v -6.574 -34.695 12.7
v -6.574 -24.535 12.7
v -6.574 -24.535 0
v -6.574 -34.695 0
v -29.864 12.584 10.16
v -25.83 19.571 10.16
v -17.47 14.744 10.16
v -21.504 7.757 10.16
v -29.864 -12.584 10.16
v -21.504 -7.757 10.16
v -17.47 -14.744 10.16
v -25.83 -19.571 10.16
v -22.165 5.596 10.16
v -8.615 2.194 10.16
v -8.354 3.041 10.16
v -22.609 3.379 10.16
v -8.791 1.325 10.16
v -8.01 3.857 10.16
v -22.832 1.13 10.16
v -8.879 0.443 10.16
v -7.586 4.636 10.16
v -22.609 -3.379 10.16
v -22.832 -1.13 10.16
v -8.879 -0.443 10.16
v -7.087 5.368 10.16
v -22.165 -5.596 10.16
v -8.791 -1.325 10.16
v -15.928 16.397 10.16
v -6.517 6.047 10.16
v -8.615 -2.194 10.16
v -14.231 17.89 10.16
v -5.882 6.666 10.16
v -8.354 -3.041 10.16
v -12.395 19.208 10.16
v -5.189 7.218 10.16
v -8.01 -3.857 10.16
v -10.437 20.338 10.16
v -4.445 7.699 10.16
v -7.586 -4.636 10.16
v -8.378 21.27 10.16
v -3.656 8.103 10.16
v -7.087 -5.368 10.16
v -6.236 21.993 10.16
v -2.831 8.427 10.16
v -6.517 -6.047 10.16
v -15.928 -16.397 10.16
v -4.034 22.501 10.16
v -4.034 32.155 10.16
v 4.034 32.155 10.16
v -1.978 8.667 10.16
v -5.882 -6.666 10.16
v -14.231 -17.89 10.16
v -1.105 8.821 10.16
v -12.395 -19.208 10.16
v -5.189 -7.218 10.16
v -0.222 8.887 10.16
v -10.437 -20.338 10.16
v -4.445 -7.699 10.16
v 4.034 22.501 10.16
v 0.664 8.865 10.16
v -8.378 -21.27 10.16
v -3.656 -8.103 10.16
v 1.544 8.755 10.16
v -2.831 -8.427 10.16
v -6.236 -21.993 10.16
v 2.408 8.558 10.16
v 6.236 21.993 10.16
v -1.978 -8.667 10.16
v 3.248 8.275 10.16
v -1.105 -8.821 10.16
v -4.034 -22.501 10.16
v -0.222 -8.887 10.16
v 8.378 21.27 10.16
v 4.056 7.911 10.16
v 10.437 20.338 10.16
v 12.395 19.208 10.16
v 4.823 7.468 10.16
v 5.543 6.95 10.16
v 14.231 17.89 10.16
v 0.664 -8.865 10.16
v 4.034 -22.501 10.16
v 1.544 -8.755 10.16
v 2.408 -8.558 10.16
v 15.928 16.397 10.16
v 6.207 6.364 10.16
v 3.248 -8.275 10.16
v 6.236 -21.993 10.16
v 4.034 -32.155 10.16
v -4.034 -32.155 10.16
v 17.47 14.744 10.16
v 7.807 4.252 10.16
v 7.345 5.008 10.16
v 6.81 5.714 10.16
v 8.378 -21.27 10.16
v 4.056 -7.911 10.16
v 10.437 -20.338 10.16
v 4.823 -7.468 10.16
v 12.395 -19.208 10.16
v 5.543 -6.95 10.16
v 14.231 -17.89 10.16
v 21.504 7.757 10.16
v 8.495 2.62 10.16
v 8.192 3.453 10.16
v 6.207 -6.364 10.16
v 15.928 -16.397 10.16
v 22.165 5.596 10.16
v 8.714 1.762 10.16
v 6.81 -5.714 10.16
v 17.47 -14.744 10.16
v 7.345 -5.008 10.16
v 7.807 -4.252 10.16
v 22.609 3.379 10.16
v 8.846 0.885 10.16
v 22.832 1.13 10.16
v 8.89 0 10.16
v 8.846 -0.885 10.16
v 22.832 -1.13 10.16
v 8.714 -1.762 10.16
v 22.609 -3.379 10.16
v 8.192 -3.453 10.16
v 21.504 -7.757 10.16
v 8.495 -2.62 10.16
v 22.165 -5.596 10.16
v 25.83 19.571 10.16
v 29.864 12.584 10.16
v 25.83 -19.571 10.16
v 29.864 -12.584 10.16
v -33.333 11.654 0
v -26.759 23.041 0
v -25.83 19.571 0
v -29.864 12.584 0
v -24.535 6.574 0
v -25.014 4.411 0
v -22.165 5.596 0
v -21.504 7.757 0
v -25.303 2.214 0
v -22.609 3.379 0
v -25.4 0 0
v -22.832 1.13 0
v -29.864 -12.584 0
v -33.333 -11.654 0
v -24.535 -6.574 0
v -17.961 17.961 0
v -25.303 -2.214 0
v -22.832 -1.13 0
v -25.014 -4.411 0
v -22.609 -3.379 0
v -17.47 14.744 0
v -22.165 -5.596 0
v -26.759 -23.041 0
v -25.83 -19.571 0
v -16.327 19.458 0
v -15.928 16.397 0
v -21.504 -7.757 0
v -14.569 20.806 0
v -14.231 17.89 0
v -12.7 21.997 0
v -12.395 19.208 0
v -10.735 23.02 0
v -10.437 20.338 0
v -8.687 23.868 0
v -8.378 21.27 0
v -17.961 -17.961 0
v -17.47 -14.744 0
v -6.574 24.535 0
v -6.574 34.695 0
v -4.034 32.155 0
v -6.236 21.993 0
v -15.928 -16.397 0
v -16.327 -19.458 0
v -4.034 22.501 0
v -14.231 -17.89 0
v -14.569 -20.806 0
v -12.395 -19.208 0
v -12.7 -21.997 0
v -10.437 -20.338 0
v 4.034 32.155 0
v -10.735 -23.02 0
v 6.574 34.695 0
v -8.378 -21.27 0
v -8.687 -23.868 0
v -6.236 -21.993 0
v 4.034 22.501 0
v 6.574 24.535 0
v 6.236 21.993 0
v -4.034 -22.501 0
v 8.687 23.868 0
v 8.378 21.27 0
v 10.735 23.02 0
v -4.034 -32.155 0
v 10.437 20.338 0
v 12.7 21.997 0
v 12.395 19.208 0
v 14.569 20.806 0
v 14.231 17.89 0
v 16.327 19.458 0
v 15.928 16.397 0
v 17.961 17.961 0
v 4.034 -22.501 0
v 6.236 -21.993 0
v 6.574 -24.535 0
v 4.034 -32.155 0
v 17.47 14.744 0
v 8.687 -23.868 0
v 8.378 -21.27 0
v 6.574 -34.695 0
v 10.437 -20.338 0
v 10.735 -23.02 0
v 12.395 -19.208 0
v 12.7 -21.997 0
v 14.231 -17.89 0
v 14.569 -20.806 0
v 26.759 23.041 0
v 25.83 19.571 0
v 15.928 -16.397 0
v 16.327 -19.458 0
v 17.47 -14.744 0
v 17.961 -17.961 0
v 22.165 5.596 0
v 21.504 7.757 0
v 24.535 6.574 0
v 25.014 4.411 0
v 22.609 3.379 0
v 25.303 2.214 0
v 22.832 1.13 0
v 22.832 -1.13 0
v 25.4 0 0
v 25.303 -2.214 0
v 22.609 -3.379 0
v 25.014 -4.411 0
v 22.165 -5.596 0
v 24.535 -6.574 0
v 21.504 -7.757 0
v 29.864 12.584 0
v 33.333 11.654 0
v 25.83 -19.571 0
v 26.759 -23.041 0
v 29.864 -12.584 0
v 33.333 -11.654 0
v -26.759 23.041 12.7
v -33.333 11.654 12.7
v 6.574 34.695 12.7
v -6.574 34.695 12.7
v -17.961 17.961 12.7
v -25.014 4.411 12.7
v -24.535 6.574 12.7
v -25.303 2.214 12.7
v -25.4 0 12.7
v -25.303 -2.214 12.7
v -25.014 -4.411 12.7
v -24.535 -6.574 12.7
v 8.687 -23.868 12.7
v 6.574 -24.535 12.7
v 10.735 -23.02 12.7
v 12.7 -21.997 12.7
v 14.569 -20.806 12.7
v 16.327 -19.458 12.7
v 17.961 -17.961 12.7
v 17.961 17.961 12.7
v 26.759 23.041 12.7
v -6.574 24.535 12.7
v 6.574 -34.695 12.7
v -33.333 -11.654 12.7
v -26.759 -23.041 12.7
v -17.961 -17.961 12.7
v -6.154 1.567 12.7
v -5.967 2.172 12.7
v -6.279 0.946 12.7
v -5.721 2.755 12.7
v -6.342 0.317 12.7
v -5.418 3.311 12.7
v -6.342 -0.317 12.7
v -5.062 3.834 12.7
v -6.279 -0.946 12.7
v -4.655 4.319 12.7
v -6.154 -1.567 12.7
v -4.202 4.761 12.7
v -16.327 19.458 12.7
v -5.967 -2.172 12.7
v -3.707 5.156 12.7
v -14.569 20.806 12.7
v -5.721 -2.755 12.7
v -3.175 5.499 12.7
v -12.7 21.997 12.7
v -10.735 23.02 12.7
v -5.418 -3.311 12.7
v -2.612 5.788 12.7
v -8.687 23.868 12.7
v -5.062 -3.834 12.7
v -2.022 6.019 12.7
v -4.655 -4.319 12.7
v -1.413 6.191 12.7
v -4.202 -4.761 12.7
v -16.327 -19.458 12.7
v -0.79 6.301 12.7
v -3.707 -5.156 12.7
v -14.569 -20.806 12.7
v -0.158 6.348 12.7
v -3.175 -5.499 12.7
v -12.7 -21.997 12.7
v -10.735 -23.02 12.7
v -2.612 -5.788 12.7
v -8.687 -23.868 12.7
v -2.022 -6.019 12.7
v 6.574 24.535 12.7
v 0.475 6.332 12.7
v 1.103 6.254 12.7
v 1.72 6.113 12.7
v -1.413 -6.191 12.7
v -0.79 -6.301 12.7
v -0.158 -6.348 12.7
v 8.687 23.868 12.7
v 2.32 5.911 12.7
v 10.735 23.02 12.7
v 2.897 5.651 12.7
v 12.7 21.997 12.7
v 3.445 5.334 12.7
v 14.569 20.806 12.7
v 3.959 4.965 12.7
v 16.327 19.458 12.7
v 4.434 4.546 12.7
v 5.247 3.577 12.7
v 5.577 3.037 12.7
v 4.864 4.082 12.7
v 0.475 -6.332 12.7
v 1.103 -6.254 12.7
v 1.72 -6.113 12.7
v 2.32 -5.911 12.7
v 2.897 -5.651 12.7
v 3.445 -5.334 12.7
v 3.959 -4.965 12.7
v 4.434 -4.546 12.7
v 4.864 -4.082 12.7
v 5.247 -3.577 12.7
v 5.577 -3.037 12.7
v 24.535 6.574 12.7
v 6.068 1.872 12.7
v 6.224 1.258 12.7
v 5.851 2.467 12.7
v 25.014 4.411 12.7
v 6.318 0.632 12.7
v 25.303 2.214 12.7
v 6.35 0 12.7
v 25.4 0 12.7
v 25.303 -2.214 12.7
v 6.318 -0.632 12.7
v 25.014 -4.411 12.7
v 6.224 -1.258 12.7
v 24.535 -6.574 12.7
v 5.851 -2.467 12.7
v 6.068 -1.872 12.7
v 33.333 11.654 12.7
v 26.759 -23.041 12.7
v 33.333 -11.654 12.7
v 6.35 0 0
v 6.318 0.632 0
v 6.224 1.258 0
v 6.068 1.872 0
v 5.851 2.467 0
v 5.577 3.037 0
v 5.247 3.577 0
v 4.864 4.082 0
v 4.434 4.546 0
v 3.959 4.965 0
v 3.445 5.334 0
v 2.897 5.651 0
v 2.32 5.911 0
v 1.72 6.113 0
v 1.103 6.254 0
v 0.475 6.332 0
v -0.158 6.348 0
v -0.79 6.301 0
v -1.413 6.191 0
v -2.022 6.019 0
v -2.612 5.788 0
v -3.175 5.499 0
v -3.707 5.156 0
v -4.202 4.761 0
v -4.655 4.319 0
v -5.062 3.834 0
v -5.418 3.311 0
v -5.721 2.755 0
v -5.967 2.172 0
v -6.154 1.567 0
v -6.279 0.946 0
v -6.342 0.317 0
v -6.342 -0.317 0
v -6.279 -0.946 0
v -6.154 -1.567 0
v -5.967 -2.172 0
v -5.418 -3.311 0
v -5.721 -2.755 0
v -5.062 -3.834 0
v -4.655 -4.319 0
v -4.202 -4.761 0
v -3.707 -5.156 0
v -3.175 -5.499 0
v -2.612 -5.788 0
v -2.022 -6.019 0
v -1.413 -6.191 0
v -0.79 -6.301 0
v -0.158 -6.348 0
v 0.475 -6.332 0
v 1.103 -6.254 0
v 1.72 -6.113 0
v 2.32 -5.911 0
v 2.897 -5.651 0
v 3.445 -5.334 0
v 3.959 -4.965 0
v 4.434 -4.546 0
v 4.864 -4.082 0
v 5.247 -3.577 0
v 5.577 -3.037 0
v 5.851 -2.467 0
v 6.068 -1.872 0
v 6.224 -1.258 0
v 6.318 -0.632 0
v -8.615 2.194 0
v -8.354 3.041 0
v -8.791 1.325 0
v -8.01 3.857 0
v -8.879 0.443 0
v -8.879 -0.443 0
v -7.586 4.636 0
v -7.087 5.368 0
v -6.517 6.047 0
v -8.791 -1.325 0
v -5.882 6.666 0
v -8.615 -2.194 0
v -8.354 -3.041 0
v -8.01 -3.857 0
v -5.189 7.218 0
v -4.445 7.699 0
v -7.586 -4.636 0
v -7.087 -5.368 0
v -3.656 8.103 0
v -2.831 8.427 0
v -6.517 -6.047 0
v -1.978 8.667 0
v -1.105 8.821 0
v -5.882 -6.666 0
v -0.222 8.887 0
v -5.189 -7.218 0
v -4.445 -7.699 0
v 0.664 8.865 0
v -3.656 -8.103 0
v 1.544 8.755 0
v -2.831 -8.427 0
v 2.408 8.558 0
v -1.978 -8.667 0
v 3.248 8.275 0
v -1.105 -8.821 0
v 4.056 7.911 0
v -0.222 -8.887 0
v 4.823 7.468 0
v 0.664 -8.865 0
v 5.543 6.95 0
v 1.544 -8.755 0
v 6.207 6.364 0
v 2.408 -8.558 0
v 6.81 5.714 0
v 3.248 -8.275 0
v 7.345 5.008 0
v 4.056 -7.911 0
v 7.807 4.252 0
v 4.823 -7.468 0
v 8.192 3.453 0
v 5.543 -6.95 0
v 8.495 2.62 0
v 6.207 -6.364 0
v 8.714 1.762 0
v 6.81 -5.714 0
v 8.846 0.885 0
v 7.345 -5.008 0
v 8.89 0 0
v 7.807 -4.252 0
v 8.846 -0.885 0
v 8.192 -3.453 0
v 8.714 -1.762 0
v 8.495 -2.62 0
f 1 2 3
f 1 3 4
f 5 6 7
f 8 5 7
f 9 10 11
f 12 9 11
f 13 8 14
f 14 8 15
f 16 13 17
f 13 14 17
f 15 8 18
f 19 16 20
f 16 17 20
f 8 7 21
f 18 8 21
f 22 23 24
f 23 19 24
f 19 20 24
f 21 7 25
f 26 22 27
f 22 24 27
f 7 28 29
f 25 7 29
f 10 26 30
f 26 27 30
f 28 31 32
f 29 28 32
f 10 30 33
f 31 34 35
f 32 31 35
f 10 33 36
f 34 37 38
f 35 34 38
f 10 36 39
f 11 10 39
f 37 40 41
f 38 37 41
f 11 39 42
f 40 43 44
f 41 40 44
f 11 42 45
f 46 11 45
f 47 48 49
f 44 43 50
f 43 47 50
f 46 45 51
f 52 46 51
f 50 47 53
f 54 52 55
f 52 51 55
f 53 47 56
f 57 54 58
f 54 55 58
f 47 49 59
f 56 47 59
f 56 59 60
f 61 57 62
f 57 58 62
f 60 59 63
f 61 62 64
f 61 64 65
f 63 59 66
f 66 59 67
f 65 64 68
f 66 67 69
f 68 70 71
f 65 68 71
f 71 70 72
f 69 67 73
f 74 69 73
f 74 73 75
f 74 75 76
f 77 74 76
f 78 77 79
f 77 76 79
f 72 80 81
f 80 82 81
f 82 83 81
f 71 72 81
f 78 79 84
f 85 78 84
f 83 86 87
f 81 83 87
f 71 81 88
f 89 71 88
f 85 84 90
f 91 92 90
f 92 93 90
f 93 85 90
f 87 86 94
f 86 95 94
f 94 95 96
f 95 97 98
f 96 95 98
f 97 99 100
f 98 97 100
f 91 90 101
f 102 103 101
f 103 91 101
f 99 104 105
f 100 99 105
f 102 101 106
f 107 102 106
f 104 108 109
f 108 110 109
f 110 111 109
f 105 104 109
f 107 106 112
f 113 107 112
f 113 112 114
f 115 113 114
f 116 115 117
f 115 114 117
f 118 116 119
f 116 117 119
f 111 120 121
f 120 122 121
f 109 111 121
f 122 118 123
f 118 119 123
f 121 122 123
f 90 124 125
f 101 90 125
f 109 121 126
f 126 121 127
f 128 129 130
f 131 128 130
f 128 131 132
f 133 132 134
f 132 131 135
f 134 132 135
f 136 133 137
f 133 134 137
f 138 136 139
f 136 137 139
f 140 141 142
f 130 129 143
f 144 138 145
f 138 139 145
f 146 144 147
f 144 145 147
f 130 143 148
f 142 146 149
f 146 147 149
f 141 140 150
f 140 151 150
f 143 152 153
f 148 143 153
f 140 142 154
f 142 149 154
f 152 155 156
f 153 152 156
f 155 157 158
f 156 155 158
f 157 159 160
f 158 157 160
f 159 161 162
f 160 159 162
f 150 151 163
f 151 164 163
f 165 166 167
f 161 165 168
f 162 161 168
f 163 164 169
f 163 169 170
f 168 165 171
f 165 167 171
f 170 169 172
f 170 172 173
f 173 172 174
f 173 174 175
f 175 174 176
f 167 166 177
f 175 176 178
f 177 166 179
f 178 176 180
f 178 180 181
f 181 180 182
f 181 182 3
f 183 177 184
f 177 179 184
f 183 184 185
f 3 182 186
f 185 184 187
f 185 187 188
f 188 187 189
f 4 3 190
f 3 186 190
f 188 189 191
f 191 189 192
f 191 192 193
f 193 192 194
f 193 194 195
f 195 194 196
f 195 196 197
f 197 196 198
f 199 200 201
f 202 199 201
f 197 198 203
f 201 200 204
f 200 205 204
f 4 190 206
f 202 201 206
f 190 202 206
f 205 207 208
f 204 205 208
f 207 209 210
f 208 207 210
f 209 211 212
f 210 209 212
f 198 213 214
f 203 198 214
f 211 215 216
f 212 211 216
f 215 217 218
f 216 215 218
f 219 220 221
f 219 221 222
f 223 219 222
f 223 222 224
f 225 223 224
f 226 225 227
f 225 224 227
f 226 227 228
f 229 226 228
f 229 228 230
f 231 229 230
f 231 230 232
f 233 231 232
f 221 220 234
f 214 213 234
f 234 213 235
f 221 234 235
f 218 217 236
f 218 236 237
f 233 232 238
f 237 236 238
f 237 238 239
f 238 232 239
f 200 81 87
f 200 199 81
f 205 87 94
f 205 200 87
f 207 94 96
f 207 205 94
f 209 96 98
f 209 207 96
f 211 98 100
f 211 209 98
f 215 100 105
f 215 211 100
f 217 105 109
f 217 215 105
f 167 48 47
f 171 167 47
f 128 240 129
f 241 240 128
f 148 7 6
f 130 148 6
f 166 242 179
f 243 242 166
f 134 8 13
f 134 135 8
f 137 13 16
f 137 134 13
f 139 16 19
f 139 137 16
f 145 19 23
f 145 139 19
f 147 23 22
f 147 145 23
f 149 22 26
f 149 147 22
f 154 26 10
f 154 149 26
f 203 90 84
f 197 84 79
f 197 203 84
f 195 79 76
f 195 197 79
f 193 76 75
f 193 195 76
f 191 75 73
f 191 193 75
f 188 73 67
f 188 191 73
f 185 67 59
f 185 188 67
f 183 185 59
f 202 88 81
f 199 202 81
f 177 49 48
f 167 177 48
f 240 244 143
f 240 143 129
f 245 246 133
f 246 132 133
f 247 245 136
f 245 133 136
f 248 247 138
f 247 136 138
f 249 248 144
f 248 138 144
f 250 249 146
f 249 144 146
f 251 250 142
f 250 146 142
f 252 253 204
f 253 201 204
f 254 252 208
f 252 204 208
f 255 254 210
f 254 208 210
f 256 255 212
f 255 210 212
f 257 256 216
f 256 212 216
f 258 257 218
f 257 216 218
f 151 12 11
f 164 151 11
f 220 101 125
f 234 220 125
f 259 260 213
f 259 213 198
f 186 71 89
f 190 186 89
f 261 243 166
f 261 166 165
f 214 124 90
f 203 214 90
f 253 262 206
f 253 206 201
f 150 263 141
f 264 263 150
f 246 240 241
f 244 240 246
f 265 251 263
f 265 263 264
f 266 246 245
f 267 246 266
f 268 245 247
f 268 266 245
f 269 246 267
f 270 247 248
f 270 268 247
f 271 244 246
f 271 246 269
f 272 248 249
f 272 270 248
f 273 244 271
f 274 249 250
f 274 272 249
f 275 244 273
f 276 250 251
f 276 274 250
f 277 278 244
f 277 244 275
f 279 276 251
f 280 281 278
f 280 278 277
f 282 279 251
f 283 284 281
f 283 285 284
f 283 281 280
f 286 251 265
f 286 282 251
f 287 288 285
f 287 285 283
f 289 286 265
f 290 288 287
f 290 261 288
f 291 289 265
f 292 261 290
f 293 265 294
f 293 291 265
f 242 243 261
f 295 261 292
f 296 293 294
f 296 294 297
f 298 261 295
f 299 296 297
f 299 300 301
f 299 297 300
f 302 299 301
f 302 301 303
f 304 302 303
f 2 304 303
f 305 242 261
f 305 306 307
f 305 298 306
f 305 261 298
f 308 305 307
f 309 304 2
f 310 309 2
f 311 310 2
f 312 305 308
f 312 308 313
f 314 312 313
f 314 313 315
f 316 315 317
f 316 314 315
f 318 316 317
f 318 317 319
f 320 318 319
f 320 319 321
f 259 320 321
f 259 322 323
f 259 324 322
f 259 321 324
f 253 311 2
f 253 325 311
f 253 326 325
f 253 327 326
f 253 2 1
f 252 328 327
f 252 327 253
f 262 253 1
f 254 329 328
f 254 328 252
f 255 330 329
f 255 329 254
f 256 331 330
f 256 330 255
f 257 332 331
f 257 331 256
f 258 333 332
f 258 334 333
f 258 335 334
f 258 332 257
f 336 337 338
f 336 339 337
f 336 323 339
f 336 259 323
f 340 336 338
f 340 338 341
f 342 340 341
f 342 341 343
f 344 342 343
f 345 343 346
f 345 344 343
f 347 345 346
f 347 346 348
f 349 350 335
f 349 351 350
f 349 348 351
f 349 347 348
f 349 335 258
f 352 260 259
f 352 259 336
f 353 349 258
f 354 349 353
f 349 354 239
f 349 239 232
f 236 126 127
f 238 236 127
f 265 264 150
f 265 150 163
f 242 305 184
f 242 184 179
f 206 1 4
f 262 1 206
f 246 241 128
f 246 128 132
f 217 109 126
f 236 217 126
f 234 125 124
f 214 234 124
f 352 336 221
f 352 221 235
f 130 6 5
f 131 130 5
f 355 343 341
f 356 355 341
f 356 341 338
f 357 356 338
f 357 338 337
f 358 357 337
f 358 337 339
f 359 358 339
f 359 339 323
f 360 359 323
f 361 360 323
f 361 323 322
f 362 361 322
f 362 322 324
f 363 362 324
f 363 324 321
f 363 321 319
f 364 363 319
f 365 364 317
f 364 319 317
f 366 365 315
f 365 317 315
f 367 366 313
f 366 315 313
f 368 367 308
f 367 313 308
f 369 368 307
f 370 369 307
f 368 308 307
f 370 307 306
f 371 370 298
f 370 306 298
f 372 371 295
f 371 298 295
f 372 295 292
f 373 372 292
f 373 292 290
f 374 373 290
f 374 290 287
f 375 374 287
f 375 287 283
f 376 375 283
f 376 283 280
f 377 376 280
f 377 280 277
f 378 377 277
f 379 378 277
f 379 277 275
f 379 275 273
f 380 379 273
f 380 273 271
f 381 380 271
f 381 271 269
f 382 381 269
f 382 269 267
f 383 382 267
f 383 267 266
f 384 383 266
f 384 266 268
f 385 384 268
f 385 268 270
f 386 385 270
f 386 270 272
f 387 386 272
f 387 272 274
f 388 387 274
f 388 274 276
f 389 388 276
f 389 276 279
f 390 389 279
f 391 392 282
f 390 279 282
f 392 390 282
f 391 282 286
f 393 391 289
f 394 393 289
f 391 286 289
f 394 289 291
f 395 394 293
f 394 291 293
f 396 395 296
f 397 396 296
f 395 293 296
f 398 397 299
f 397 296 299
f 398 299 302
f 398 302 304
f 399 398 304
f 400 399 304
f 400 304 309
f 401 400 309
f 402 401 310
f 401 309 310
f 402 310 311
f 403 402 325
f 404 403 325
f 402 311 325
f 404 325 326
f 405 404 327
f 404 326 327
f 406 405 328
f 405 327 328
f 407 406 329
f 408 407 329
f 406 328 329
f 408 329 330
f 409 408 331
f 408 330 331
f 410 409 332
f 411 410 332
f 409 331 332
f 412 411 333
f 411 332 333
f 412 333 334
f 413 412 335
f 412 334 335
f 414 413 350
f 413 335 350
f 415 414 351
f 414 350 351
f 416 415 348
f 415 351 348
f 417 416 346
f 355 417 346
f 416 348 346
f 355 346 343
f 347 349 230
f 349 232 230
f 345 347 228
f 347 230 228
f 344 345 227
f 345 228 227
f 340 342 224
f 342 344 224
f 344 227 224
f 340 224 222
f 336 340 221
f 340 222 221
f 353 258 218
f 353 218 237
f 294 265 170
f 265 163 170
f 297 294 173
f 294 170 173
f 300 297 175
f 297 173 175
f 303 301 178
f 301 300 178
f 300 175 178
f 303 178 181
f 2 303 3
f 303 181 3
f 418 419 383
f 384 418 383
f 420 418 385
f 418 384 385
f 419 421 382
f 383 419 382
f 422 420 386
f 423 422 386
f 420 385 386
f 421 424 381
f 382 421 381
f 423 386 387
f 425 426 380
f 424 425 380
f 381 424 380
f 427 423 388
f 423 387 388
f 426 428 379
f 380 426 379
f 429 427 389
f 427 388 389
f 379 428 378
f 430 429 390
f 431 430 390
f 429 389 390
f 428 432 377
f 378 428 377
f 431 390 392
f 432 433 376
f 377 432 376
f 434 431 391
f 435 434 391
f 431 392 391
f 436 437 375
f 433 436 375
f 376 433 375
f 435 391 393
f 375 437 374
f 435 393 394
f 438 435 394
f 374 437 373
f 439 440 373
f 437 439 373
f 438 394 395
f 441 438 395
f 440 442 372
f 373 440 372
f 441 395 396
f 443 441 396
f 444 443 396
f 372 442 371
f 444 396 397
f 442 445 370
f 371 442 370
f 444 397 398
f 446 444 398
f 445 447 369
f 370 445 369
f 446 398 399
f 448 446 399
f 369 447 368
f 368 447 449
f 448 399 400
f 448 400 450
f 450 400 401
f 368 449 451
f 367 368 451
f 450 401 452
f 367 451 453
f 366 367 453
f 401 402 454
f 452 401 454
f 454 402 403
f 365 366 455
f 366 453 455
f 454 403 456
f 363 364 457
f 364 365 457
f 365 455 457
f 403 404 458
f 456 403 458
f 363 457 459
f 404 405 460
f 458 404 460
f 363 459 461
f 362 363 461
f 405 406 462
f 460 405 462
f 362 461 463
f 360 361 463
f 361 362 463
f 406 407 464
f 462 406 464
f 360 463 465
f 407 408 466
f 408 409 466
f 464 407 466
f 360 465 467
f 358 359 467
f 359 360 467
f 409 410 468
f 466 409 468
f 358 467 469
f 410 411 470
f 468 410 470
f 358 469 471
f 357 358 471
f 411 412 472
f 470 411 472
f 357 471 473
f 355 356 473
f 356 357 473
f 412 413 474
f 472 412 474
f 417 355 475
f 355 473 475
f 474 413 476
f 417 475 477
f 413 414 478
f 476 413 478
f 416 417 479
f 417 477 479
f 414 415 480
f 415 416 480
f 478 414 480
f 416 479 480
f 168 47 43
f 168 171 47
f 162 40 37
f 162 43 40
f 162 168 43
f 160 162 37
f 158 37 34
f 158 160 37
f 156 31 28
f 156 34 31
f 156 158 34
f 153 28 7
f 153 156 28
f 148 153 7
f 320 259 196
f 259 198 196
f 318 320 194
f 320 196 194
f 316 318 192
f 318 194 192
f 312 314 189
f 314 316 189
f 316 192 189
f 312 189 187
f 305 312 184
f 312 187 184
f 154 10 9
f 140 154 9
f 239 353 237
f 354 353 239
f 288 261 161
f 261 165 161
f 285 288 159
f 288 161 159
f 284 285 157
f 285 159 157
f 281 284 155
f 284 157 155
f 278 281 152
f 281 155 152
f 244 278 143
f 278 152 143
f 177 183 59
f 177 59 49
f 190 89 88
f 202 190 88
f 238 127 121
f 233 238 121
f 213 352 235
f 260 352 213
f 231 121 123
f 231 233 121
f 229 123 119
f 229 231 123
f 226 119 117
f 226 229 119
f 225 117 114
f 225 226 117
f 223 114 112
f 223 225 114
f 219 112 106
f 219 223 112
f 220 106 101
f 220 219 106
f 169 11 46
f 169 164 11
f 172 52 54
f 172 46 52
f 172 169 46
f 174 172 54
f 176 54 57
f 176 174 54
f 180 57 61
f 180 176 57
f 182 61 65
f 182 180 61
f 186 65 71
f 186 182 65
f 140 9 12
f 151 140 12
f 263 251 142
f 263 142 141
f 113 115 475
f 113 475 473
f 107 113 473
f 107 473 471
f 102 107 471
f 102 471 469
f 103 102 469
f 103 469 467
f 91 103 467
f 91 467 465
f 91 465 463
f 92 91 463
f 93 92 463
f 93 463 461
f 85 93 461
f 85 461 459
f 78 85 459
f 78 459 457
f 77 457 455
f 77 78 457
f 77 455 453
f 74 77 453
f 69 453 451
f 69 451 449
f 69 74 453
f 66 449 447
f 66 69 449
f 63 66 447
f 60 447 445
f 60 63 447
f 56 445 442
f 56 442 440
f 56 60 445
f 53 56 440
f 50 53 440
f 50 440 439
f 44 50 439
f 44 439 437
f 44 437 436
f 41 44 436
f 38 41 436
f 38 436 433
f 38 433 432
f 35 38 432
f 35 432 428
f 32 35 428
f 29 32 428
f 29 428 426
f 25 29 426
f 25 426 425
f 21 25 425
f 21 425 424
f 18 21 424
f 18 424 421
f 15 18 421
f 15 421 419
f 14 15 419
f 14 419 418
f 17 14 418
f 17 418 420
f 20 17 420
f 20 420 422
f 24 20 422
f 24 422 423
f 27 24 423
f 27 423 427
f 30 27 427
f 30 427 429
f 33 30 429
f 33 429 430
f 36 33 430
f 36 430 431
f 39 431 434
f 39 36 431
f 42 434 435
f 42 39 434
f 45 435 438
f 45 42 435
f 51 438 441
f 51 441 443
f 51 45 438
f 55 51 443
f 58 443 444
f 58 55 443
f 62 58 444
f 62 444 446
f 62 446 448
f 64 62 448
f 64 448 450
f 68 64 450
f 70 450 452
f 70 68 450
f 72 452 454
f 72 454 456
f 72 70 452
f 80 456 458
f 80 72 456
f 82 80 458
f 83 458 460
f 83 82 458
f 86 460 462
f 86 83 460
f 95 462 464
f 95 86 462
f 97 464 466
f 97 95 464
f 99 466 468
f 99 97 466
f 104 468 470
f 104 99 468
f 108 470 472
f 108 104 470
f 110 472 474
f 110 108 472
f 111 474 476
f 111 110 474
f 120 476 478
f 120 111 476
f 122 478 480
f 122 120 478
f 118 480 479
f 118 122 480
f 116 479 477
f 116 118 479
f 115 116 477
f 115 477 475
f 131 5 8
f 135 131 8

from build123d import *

# Parameters (mm, degrees)
F0_R     = 25.4
F1_DEPTH = 12.7
F3_DEPTH = 12.7
F5_COUNT = 6
F6_R     = 6.35
F7_DEPTH = 25.4
F8_T     = -2.54


with BuildPart() as f1:
    # F0 (on Top) → F1 (new body)
    with BuildSketch(Plane.XY):
        Circle(F0_R)
    extrude(amount=F1_DEPTH)

    # F2 (on face) → F3 (join)
    with BuildSketch(Plane.XY.offset(12.7)):
        Polygon((-6.5740037456, 24.5345159877), (0, 0), (0, 24.5345159877), align=None)
        Polygon((0, 24.5345159877), (0, 0), (6.5740037456, 24.5345159877), align=None)
        Polygon((-6.5740037456, 24.5345159877), (0, 24.5345159877), (6.5740037456, 24.5345159877), (6.5740037456, 34.6945151687), (-6.5740037456, 34.6945151687), align=None)
    extrude(amount=-F3_DEPTH)

    # F5: F1 ×6 about axis
    f5_axis = Axis((0, 0, 27.9026478529), (0, 0, 1))


with BuildPart() as f1_1:
    add(f1.part)
    for i in range(1, F5_COUNT):
        add(f1.part.rotate(f5_axis, i * 360 / F5_COUNT))

    # F6 (on face) → F7 (cut)
    with BuildSketch(Plane.XY.offset(12.7)):
        Circle(F6_R)
    extrude(amount=-F7_DEPTH, mode=Mode.SUBTRACT)

    # F8
    f8_openings = [f1_1.faces().sort_by_distance(p)[0] for p in [
        (-24.437748, 0, 0),
    ]]
    offset(amount=F8_T, openings=f8_openings, kind=Kind.INTERSECTION)


solid = f1_1.part
